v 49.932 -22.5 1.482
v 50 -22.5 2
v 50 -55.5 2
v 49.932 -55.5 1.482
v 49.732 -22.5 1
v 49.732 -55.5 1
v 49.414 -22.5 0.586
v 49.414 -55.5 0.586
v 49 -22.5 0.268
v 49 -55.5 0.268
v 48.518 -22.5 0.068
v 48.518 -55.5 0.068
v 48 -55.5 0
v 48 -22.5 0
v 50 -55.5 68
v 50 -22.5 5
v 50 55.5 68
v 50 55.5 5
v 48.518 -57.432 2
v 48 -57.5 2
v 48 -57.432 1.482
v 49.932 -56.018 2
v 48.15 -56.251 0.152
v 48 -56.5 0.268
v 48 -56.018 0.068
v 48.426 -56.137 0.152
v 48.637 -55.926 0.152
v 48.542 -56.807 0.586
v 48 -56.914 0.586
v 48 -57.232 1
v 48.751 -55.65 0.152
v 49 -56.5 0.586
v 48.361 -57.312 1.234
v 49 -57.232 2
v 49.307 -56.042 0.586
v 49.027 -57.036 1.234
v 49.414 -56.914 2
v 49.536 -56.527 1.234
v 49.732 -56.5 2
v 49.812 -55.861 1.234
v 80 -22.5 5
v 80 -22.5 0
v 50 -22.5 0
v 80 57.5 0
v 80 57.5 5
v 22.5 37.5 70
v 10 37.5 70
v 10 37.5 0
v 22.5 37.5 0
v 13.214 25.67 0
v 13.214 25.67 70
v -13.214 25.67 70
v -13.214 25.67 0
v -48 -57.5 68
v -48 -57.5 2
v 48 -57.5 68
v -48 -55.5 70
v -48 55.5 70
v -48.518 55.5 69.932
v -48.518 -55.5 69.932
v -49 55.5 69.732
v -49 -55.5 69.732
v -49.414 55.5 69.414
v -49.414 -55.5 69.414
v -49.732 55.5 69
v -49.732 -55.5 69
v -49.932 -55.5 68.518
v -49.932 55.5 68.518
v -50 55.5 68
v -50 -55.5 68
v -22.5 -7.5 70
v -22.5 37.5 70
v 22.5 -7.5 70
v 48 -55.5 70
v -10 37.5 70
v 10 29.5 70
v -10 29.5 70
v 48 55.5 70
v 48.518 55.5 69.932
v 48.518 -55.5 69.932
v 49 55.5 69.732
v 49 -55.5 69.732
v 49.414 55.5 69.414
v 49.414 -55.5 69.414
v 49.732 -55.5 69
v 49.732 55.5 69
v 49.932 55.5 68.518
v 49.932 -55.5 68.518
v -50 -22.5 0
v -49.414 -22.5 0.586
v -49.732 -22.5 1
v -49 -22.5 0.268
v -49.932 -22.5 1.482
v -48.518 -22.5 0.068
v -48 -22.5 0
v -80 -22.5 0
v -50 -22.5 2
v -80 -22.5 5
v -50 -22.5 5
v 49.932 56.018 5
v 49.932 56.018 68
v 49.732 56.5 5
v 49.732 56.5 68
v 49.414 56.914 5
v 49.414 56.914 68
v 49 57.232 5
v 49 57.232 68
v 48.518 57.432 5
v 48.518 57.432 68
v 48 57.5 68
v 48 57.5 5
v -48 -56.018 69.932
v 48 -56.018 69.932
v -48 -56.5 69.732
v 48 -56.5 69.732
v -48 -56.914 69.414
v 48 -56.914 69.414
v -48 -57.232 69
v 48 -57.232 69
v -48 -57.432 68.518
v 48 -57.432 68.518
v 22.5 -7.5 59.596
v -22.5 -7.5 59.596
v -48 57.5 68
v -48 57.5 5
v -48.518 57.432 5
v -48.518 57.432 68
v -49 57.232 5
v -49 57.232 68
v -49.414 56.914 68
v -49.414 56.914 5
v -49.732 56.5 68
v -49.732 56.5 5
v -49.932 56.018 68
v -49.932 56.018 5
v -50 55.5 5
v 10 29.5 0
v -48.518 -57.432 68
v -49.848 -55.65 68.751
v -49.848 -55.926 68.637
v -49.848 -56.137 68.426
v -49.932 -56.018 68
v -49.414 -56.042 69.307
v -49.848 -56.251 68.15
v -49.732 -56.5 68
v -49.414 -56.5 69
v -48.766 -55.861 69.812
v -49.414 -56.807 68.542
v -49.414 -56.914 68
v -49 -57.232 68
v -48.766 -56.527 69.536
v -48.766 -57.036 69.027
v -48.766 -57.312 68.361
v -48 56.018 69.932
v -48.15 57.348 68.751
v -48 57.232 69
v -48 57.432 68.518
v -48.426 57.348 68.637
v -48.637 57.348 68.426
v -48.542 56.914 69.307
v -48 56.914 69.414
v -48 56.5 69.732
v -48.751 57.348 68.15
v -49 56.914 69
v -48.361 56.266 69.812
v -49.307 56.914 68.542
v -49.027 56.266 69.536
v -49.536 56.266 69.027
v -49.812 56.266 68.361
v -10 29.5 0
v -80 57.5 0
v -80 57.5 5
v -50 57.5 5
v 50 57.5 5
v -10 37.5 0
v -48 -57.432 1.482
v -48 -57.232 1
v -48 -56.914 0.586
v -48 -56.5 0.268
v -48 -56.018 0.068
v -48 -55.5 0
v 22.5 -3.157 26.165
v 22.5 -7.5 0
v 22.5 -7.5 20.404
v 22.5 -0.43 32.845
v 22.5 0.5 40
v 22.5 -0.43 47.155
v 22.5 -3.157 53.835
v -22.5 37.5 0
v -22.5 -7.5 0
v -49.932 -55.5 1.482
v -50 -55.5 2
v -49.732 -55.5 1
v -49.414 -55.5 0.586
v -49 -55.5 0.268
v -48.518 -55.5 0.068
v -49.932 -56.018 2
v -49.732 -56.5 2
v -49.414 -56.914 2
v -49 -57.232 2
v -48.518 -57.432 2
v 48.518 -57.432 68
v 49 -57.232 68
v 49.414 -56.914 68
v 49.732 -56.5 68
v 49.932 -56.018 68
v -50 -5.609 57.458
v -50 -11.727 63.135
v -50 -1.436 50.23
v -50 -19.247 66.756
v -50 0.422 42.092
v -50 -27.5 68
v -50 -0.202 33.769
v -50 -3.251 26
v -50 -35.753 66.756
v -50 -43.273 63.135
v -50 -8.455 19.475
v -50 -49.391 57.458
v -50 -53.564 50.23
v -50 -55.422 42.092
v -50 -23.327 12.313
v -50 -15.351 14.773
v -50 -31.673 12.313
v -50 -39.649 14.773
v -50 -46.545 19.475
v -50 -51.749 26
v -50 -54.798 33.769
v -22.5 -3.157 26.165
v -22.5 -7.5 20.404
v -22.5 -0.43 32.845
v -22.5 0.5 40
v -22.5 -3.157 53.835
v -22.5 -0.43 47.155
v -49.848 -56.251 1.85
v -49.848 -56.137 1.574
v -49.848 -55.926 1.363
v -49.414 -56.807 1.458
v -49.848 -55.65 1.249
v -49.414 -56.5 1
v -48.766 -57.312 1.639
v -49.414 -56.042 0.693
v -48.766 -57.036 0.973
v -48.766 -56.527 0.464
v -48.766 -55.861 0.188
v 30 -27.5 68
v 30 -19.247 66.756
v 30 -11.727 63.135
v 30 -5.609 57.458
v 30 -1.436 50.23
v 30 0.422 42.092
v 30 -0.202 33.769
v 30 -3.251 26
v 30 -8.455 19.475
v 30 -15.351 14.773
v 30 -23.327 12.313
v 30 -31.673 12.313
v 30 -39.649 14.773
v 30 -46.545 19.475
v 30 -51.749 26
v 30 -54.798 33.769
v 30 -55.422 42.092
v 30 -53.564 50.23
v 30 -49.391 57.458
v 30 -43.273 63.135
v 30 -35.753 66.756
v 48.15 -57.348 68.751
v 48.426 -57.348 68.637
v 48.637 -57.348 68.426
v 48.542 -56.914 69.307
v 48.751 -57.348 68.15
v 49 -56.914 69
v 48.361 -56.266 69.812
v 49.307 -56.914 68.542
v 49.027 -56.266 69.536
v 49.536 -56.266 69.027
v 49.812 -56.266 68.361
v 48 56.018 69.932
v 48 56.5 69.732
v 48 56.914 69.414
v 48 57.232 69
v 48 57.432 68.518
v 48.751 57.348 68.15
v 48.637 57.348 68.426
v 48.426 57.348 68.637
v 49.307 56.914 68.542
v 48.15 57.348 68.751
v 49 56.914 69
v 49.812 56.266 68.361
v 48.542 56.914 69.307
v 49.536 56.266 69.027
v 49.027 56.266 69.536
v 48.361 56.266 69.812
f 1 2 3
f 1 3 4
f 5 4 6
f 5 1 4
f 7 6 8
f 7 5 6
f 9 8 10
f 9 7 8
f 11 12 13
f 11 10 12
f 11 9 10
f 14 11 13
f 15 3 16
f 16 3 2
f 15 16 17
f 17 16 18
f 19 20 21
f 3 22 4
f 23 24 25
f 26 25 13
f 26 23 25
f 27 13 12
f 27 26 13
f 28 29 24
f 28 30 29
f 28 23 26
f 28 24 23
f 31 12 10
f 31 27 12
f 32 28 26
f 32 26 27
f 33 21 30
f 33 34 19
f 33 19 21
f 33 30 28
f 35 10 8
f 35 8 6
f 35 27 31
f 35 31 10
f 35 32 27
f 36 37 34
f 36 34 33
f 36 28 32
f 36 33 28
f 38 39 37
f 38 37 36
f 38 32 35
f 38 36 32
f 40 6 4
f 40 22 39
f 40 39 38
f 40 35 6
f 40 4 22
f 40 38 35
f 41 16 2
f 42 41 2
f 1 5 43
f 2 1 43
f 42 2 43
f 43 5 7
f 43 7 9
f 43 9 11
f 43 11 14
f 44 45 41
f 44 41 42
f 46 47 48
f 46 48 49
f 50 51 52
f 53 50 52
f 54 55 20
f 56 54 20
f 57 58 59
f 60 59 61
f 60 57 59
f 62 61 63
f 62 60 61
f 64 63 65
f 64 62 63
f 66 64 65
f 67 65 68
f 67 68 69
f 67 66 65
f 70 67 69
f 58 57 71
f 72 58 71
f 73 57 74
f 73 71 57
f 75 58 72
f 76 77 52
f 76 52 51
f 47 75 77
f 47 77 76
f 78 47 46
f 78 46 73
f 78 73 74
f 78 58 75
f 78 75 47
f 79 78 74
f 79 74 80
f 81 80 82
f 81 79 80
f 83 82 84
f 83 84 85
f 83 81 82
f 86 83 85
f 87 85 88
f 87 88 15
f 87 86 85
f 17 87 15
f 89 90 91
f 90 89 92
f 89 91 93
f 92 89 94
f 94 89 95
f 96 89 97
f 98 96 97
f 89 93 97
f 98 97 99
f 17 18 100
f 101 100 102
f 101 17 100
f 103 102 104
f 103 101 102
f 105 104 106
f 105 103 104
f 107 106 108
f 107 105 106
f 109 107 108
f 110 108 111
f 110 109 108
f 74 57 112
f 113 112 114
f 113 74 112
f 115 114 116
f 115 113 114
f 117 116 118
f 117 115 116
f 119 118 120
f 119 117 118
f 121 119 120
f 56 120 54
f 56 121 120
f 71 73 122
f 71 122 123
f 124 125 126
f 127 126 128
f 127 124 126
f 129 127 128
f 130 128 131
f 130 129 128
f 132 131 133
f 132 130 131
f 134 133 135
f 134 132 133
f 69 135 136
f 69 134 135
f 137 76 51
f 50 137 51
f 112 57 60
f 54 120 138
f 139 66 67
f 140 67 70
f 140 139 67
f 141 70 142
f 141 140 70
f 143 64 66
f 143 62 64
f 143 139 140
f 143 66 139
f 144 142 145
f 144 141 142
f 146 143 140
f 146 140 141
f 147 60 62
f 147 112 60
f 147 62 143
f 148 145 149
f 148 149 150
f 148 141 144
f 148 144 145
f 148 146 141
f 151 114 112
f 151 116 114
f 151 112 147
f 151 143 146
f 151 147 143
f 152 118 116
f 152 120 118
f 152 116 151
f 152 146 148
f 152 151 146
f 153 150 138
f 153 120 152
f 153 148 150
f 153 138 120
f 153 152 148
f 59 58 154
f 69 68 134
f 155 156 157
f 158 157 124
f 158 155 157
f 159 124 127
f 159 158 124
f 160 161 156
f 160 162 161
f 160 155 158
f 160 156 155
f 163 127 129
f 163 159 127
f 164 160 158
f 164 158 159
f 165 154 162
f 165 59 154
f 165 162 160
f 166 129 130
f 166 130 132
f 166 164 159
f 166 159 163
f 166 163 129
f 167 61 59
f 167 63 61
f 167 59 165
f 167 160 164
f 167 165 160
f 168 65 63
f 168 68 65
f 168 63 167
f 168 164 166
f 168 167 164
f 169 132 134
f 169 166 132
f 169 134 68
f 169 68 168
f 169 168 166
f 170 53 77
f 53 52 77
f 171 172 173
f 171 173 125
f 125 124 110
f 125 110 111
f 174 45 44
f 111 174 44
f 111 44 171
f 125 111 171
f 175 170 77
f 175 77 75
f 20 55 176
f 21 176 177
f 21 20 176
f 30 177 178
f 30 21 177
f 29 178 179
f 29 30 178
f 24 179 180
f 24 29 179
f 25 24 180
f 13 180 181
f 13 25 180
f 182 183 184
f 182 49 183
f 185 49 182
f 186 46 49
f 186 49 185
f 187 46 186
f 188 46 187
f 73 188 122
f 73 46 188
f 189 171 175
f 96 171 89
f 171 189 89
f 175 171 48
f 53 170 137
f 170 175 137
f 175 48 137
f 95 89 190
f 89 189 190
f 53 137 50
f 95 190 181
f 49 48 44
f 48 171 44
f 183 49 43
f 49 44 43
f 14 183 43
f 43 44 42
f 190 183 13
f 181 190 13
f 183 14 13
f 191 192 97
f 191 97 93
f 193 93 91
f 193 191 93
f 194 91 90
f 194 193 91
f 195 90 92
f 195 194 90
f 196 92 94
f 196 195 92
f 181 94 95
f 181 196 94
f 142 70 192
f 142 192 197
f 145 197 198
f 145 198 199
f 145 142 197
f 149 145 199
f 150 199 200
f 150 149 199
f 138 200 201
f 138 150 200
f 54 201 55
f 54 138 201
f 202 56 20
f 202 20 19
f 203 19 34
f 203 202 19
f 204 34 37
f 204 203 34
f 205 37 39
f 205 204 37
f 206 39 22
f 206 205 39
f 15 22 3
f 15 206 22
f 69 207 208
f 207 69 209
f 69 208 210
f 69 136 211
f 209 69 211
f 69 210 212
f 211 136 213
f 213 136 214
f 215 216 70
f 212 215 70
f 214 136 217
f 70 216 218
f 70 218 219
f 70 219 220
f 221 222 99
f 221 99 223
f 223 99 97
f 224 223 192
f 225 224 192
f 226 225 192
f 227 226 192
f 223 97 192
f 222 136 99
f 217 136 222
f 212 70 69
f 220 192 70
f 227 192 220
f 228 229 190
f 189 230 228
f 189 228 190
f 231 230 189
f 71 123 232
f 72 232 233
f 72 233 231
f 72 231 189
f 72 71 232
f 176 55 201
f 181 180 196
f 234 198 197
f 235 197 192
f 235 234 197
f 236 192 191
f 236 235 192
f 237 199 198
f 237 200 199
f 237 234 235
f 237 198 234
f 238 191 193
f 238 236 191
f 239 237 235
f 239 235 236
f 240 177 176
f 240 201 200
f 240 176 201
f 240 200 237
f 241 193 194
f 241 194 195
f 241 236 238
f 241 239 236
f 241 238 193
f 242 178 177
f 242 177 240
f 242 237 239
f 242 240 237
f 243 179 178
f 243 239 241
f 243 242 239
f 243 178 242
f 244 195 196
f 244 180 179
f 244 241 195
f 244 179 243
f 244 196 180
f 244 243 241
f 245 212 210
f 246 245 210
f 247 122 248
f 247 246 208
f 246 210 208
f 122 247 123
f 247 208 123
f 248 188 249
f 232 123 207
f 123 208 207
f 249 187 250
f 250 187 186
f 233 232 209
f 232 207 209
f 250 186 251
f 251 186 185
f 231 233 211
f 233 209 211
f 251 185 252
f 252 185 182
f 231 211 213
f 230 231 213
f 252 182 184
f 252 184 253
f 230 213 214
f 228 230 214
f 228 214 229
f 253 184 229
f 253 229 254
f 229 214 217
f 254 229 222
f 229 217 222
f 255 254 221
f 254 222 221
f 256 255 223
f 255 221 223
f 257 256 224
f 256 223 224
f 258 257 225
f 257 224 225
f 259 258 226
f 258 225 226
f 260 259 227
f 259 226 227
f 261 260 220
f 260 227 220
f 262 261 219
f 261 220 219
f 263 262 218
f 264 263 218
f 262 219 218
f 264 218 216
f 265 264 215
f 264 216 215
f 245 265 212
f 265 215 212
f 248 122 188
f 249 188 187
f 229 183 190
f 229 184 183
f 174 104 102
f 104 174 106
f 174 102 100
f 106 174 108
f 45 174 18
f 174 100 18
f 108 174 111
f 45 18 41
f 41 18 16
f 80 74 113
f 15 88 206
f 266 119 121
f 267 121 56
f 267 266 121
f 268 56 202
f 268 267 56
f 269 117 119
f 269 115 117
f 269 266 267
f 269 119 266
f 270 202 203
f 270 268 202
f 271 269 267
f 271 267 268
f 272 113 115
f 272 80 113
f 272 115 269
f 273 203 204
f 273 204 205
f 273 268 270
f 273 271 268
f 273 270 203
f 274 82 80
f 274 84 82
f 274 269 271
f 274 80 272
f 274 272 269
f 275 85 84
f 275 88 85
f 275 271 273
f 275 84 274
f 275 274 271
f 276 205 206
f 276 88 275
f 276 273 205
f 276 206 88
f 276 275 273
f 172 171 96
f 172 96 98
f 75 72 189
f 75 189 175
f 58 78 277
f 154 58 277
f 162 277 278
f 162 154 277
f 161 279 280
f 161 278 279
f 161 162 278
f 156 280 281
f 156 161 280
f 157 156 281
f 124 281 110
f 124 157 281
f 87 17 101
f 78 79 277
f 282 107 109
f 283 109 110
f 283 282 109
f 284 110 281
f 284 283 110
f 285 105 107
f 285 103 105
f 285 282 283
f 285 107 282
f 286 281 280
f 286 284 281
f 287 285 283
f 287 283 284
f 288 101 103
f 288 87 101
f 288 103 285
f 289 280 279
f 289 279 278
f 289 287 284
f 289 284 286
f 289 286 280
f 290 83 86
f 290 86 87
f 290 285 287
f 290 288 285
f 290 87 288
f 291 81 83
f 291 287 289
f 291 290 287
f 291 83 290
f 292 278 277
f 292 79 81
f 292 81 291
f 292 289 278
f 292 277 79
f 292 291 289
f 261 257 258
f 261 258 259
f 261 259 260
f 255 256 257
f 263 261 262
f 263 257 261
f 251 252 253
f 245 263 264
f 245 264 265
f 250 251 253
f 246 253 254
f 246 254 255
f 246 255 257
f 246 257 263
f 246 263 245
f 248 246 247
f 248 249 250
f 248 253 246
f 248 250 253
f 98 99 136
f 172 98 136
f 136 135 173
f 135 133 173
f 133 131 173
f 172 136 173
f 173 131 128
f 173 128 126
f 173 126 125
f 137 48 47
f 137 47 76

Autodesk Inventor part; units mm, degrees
ref_plane "YZ Plane" through (0, 0, 0) normal (1, 0, 0) x (0, 1, 0)
ref_plane "XZ Plane" through (0, 0, 0) normal (0, 1, 0) x (-1, 0, 0)
ref_plane "XY Plane" through (0, 0, 0) normal (0, 0, 1) x (1, 0, 0)
sketch "Sketch1" plane through (0, 0, 0) normal (0, 0, 1) x (1, 0, 0)
  line L0 (-50, -57.5) -> (50, -57.5)
  line L1 (50, -57.5) -> (50, 57.5)
  line L2 (50, 57.5) -> (-50, 57.5)
  line L3 (-50, 57.5) -> (-50, -57.5)
  line L4 (-50, -57.5) -> (50, 57.5) construction
  line L5 (50, -57.5) -> (-50, 57.5) construction
  point P0 (0, 0)
  dimension "d0" = 100
  dimension "d1" = 115
extrude "Extrusion1" add sketch "Sketch1" along normal blind 70
sketch "Sketch2" plane through (50, -57.5, 0) normal (1, 0, 0) x (0, 0, -1)
  line L0 (0, 0) -> (0, 115) projected
  line L1 (0, 115) -> (-5, 115)
  line L2 (-5, 115) -> (-5, 35)
  line L3 (-5, 35) -> (0, 35)
  line L4 (0, 35) -> (0, 115)
  point P0 (0, 57.5)
  point P1 (0, 35)
  dimension "d4" = 5
  dimension "d5" = 80
extrude "Extrusion2" add sketch "Sketch2" along normal blind 30
mirror "Mirror1" about plane through (0, 0, 0) normal (1, 0, 0) of "Extrusion2"
sketch "Sketch3" plane through (0, 0, 70) normal (0, 0, 1) x (1, 0, 0)
  line L0 (-22.5, 37.5) -> (22.5, 37.5)
  line L1 (22.5, 37.5) -> (22.5, -7.5)
  line L2 (22.5, -7.5) -> (-22.5, -7.5)
  line L3 (-22.5, -7.5) -> (-22.5, 37.5)
  line L4 (0, 50) -> (0, -57.5) construction
  line L5 (-50, -57.5) -> (50, -57.5) construction
  line L6 (50, 57.5) -> (-50, 57.5) projected
  point P0 (0, 0)
  point P1 (22.5, 15)
  dimension "d8" = 45
  dimension "d9" = 45
  dimension "d10" = 20
extrude "Extrusion3" cut sketch "Sketch3" against normal through all
sketch "Sketch4" plane through (-50, -57.5, 70) normal (-1, 0, 0) x (0, 0, 1)
  circle A0 centre (-30, 30) radius 28
  line L0 (0, 115) -> (0, 0) projected
  line L1 (-70, 0) -> (0, 0) projected
  point P0 (-70, 57.5)
  dimension "d13" = 56
  dimension "d14" = 30
  dimension "d15" = 30
extrude "Extrusion4" cut sketch "Sketch4" against normal blind 80
sketch "Sketch5" plane through (0, 0, 70) normal (0, 0, 1) x (1, 0, 0)
  line L0 (-20, -2.5) -> (20, -2.5) projected
  line L1 (20, -2.5) -> (20, 37.5) projected
  line L2 (20, 37.5) -> (10, 37.5) projected
  line L3 (10, 37.5) -> (10, 29.5) projected
  line L4 (10, 29.5) -> (13.2139, 25.6698) projected
  line L5 (13.2139, 25.6698) -> (-13.2139, 25.6698) projected
  line L6 (-13.2139, 25.6698) -> (-10, 29.5) projected
  line L7 (-10, 29.5) -> (-10, 37.5) projected
  line L8 (-10, 37.5) -> (-20, 37.5) projected
  line L9 (-20, 37.5) -> (-20, -2.5) projected
  line L10 (10, 37.5) -> (-10, 37.5)
  line L11 (-22.5, 37.5) -> (22.5, 37.5) projected
  point P0 (0, 0)
extrude "Extrusion5" add sketch "Sketch5" against normal up to surface (70 mm away) contours L10 L3 L4 L5 L6 L7
fillet "Fillet1" radius 2 11 edges at (50, 0, 70) (0, -57.5, 70) (-50, 0, 70) (0, 57.5, 70) (50, -57.5, 35) (0, -57.5, 0) (50, -40, 0) (-50, -57.5, 35) (50, 57.5, 37.5) (-50, 57.5, 37.5) (-50, -40, 0)
properties part number "Motor_case" material "Iron, Ductile"
